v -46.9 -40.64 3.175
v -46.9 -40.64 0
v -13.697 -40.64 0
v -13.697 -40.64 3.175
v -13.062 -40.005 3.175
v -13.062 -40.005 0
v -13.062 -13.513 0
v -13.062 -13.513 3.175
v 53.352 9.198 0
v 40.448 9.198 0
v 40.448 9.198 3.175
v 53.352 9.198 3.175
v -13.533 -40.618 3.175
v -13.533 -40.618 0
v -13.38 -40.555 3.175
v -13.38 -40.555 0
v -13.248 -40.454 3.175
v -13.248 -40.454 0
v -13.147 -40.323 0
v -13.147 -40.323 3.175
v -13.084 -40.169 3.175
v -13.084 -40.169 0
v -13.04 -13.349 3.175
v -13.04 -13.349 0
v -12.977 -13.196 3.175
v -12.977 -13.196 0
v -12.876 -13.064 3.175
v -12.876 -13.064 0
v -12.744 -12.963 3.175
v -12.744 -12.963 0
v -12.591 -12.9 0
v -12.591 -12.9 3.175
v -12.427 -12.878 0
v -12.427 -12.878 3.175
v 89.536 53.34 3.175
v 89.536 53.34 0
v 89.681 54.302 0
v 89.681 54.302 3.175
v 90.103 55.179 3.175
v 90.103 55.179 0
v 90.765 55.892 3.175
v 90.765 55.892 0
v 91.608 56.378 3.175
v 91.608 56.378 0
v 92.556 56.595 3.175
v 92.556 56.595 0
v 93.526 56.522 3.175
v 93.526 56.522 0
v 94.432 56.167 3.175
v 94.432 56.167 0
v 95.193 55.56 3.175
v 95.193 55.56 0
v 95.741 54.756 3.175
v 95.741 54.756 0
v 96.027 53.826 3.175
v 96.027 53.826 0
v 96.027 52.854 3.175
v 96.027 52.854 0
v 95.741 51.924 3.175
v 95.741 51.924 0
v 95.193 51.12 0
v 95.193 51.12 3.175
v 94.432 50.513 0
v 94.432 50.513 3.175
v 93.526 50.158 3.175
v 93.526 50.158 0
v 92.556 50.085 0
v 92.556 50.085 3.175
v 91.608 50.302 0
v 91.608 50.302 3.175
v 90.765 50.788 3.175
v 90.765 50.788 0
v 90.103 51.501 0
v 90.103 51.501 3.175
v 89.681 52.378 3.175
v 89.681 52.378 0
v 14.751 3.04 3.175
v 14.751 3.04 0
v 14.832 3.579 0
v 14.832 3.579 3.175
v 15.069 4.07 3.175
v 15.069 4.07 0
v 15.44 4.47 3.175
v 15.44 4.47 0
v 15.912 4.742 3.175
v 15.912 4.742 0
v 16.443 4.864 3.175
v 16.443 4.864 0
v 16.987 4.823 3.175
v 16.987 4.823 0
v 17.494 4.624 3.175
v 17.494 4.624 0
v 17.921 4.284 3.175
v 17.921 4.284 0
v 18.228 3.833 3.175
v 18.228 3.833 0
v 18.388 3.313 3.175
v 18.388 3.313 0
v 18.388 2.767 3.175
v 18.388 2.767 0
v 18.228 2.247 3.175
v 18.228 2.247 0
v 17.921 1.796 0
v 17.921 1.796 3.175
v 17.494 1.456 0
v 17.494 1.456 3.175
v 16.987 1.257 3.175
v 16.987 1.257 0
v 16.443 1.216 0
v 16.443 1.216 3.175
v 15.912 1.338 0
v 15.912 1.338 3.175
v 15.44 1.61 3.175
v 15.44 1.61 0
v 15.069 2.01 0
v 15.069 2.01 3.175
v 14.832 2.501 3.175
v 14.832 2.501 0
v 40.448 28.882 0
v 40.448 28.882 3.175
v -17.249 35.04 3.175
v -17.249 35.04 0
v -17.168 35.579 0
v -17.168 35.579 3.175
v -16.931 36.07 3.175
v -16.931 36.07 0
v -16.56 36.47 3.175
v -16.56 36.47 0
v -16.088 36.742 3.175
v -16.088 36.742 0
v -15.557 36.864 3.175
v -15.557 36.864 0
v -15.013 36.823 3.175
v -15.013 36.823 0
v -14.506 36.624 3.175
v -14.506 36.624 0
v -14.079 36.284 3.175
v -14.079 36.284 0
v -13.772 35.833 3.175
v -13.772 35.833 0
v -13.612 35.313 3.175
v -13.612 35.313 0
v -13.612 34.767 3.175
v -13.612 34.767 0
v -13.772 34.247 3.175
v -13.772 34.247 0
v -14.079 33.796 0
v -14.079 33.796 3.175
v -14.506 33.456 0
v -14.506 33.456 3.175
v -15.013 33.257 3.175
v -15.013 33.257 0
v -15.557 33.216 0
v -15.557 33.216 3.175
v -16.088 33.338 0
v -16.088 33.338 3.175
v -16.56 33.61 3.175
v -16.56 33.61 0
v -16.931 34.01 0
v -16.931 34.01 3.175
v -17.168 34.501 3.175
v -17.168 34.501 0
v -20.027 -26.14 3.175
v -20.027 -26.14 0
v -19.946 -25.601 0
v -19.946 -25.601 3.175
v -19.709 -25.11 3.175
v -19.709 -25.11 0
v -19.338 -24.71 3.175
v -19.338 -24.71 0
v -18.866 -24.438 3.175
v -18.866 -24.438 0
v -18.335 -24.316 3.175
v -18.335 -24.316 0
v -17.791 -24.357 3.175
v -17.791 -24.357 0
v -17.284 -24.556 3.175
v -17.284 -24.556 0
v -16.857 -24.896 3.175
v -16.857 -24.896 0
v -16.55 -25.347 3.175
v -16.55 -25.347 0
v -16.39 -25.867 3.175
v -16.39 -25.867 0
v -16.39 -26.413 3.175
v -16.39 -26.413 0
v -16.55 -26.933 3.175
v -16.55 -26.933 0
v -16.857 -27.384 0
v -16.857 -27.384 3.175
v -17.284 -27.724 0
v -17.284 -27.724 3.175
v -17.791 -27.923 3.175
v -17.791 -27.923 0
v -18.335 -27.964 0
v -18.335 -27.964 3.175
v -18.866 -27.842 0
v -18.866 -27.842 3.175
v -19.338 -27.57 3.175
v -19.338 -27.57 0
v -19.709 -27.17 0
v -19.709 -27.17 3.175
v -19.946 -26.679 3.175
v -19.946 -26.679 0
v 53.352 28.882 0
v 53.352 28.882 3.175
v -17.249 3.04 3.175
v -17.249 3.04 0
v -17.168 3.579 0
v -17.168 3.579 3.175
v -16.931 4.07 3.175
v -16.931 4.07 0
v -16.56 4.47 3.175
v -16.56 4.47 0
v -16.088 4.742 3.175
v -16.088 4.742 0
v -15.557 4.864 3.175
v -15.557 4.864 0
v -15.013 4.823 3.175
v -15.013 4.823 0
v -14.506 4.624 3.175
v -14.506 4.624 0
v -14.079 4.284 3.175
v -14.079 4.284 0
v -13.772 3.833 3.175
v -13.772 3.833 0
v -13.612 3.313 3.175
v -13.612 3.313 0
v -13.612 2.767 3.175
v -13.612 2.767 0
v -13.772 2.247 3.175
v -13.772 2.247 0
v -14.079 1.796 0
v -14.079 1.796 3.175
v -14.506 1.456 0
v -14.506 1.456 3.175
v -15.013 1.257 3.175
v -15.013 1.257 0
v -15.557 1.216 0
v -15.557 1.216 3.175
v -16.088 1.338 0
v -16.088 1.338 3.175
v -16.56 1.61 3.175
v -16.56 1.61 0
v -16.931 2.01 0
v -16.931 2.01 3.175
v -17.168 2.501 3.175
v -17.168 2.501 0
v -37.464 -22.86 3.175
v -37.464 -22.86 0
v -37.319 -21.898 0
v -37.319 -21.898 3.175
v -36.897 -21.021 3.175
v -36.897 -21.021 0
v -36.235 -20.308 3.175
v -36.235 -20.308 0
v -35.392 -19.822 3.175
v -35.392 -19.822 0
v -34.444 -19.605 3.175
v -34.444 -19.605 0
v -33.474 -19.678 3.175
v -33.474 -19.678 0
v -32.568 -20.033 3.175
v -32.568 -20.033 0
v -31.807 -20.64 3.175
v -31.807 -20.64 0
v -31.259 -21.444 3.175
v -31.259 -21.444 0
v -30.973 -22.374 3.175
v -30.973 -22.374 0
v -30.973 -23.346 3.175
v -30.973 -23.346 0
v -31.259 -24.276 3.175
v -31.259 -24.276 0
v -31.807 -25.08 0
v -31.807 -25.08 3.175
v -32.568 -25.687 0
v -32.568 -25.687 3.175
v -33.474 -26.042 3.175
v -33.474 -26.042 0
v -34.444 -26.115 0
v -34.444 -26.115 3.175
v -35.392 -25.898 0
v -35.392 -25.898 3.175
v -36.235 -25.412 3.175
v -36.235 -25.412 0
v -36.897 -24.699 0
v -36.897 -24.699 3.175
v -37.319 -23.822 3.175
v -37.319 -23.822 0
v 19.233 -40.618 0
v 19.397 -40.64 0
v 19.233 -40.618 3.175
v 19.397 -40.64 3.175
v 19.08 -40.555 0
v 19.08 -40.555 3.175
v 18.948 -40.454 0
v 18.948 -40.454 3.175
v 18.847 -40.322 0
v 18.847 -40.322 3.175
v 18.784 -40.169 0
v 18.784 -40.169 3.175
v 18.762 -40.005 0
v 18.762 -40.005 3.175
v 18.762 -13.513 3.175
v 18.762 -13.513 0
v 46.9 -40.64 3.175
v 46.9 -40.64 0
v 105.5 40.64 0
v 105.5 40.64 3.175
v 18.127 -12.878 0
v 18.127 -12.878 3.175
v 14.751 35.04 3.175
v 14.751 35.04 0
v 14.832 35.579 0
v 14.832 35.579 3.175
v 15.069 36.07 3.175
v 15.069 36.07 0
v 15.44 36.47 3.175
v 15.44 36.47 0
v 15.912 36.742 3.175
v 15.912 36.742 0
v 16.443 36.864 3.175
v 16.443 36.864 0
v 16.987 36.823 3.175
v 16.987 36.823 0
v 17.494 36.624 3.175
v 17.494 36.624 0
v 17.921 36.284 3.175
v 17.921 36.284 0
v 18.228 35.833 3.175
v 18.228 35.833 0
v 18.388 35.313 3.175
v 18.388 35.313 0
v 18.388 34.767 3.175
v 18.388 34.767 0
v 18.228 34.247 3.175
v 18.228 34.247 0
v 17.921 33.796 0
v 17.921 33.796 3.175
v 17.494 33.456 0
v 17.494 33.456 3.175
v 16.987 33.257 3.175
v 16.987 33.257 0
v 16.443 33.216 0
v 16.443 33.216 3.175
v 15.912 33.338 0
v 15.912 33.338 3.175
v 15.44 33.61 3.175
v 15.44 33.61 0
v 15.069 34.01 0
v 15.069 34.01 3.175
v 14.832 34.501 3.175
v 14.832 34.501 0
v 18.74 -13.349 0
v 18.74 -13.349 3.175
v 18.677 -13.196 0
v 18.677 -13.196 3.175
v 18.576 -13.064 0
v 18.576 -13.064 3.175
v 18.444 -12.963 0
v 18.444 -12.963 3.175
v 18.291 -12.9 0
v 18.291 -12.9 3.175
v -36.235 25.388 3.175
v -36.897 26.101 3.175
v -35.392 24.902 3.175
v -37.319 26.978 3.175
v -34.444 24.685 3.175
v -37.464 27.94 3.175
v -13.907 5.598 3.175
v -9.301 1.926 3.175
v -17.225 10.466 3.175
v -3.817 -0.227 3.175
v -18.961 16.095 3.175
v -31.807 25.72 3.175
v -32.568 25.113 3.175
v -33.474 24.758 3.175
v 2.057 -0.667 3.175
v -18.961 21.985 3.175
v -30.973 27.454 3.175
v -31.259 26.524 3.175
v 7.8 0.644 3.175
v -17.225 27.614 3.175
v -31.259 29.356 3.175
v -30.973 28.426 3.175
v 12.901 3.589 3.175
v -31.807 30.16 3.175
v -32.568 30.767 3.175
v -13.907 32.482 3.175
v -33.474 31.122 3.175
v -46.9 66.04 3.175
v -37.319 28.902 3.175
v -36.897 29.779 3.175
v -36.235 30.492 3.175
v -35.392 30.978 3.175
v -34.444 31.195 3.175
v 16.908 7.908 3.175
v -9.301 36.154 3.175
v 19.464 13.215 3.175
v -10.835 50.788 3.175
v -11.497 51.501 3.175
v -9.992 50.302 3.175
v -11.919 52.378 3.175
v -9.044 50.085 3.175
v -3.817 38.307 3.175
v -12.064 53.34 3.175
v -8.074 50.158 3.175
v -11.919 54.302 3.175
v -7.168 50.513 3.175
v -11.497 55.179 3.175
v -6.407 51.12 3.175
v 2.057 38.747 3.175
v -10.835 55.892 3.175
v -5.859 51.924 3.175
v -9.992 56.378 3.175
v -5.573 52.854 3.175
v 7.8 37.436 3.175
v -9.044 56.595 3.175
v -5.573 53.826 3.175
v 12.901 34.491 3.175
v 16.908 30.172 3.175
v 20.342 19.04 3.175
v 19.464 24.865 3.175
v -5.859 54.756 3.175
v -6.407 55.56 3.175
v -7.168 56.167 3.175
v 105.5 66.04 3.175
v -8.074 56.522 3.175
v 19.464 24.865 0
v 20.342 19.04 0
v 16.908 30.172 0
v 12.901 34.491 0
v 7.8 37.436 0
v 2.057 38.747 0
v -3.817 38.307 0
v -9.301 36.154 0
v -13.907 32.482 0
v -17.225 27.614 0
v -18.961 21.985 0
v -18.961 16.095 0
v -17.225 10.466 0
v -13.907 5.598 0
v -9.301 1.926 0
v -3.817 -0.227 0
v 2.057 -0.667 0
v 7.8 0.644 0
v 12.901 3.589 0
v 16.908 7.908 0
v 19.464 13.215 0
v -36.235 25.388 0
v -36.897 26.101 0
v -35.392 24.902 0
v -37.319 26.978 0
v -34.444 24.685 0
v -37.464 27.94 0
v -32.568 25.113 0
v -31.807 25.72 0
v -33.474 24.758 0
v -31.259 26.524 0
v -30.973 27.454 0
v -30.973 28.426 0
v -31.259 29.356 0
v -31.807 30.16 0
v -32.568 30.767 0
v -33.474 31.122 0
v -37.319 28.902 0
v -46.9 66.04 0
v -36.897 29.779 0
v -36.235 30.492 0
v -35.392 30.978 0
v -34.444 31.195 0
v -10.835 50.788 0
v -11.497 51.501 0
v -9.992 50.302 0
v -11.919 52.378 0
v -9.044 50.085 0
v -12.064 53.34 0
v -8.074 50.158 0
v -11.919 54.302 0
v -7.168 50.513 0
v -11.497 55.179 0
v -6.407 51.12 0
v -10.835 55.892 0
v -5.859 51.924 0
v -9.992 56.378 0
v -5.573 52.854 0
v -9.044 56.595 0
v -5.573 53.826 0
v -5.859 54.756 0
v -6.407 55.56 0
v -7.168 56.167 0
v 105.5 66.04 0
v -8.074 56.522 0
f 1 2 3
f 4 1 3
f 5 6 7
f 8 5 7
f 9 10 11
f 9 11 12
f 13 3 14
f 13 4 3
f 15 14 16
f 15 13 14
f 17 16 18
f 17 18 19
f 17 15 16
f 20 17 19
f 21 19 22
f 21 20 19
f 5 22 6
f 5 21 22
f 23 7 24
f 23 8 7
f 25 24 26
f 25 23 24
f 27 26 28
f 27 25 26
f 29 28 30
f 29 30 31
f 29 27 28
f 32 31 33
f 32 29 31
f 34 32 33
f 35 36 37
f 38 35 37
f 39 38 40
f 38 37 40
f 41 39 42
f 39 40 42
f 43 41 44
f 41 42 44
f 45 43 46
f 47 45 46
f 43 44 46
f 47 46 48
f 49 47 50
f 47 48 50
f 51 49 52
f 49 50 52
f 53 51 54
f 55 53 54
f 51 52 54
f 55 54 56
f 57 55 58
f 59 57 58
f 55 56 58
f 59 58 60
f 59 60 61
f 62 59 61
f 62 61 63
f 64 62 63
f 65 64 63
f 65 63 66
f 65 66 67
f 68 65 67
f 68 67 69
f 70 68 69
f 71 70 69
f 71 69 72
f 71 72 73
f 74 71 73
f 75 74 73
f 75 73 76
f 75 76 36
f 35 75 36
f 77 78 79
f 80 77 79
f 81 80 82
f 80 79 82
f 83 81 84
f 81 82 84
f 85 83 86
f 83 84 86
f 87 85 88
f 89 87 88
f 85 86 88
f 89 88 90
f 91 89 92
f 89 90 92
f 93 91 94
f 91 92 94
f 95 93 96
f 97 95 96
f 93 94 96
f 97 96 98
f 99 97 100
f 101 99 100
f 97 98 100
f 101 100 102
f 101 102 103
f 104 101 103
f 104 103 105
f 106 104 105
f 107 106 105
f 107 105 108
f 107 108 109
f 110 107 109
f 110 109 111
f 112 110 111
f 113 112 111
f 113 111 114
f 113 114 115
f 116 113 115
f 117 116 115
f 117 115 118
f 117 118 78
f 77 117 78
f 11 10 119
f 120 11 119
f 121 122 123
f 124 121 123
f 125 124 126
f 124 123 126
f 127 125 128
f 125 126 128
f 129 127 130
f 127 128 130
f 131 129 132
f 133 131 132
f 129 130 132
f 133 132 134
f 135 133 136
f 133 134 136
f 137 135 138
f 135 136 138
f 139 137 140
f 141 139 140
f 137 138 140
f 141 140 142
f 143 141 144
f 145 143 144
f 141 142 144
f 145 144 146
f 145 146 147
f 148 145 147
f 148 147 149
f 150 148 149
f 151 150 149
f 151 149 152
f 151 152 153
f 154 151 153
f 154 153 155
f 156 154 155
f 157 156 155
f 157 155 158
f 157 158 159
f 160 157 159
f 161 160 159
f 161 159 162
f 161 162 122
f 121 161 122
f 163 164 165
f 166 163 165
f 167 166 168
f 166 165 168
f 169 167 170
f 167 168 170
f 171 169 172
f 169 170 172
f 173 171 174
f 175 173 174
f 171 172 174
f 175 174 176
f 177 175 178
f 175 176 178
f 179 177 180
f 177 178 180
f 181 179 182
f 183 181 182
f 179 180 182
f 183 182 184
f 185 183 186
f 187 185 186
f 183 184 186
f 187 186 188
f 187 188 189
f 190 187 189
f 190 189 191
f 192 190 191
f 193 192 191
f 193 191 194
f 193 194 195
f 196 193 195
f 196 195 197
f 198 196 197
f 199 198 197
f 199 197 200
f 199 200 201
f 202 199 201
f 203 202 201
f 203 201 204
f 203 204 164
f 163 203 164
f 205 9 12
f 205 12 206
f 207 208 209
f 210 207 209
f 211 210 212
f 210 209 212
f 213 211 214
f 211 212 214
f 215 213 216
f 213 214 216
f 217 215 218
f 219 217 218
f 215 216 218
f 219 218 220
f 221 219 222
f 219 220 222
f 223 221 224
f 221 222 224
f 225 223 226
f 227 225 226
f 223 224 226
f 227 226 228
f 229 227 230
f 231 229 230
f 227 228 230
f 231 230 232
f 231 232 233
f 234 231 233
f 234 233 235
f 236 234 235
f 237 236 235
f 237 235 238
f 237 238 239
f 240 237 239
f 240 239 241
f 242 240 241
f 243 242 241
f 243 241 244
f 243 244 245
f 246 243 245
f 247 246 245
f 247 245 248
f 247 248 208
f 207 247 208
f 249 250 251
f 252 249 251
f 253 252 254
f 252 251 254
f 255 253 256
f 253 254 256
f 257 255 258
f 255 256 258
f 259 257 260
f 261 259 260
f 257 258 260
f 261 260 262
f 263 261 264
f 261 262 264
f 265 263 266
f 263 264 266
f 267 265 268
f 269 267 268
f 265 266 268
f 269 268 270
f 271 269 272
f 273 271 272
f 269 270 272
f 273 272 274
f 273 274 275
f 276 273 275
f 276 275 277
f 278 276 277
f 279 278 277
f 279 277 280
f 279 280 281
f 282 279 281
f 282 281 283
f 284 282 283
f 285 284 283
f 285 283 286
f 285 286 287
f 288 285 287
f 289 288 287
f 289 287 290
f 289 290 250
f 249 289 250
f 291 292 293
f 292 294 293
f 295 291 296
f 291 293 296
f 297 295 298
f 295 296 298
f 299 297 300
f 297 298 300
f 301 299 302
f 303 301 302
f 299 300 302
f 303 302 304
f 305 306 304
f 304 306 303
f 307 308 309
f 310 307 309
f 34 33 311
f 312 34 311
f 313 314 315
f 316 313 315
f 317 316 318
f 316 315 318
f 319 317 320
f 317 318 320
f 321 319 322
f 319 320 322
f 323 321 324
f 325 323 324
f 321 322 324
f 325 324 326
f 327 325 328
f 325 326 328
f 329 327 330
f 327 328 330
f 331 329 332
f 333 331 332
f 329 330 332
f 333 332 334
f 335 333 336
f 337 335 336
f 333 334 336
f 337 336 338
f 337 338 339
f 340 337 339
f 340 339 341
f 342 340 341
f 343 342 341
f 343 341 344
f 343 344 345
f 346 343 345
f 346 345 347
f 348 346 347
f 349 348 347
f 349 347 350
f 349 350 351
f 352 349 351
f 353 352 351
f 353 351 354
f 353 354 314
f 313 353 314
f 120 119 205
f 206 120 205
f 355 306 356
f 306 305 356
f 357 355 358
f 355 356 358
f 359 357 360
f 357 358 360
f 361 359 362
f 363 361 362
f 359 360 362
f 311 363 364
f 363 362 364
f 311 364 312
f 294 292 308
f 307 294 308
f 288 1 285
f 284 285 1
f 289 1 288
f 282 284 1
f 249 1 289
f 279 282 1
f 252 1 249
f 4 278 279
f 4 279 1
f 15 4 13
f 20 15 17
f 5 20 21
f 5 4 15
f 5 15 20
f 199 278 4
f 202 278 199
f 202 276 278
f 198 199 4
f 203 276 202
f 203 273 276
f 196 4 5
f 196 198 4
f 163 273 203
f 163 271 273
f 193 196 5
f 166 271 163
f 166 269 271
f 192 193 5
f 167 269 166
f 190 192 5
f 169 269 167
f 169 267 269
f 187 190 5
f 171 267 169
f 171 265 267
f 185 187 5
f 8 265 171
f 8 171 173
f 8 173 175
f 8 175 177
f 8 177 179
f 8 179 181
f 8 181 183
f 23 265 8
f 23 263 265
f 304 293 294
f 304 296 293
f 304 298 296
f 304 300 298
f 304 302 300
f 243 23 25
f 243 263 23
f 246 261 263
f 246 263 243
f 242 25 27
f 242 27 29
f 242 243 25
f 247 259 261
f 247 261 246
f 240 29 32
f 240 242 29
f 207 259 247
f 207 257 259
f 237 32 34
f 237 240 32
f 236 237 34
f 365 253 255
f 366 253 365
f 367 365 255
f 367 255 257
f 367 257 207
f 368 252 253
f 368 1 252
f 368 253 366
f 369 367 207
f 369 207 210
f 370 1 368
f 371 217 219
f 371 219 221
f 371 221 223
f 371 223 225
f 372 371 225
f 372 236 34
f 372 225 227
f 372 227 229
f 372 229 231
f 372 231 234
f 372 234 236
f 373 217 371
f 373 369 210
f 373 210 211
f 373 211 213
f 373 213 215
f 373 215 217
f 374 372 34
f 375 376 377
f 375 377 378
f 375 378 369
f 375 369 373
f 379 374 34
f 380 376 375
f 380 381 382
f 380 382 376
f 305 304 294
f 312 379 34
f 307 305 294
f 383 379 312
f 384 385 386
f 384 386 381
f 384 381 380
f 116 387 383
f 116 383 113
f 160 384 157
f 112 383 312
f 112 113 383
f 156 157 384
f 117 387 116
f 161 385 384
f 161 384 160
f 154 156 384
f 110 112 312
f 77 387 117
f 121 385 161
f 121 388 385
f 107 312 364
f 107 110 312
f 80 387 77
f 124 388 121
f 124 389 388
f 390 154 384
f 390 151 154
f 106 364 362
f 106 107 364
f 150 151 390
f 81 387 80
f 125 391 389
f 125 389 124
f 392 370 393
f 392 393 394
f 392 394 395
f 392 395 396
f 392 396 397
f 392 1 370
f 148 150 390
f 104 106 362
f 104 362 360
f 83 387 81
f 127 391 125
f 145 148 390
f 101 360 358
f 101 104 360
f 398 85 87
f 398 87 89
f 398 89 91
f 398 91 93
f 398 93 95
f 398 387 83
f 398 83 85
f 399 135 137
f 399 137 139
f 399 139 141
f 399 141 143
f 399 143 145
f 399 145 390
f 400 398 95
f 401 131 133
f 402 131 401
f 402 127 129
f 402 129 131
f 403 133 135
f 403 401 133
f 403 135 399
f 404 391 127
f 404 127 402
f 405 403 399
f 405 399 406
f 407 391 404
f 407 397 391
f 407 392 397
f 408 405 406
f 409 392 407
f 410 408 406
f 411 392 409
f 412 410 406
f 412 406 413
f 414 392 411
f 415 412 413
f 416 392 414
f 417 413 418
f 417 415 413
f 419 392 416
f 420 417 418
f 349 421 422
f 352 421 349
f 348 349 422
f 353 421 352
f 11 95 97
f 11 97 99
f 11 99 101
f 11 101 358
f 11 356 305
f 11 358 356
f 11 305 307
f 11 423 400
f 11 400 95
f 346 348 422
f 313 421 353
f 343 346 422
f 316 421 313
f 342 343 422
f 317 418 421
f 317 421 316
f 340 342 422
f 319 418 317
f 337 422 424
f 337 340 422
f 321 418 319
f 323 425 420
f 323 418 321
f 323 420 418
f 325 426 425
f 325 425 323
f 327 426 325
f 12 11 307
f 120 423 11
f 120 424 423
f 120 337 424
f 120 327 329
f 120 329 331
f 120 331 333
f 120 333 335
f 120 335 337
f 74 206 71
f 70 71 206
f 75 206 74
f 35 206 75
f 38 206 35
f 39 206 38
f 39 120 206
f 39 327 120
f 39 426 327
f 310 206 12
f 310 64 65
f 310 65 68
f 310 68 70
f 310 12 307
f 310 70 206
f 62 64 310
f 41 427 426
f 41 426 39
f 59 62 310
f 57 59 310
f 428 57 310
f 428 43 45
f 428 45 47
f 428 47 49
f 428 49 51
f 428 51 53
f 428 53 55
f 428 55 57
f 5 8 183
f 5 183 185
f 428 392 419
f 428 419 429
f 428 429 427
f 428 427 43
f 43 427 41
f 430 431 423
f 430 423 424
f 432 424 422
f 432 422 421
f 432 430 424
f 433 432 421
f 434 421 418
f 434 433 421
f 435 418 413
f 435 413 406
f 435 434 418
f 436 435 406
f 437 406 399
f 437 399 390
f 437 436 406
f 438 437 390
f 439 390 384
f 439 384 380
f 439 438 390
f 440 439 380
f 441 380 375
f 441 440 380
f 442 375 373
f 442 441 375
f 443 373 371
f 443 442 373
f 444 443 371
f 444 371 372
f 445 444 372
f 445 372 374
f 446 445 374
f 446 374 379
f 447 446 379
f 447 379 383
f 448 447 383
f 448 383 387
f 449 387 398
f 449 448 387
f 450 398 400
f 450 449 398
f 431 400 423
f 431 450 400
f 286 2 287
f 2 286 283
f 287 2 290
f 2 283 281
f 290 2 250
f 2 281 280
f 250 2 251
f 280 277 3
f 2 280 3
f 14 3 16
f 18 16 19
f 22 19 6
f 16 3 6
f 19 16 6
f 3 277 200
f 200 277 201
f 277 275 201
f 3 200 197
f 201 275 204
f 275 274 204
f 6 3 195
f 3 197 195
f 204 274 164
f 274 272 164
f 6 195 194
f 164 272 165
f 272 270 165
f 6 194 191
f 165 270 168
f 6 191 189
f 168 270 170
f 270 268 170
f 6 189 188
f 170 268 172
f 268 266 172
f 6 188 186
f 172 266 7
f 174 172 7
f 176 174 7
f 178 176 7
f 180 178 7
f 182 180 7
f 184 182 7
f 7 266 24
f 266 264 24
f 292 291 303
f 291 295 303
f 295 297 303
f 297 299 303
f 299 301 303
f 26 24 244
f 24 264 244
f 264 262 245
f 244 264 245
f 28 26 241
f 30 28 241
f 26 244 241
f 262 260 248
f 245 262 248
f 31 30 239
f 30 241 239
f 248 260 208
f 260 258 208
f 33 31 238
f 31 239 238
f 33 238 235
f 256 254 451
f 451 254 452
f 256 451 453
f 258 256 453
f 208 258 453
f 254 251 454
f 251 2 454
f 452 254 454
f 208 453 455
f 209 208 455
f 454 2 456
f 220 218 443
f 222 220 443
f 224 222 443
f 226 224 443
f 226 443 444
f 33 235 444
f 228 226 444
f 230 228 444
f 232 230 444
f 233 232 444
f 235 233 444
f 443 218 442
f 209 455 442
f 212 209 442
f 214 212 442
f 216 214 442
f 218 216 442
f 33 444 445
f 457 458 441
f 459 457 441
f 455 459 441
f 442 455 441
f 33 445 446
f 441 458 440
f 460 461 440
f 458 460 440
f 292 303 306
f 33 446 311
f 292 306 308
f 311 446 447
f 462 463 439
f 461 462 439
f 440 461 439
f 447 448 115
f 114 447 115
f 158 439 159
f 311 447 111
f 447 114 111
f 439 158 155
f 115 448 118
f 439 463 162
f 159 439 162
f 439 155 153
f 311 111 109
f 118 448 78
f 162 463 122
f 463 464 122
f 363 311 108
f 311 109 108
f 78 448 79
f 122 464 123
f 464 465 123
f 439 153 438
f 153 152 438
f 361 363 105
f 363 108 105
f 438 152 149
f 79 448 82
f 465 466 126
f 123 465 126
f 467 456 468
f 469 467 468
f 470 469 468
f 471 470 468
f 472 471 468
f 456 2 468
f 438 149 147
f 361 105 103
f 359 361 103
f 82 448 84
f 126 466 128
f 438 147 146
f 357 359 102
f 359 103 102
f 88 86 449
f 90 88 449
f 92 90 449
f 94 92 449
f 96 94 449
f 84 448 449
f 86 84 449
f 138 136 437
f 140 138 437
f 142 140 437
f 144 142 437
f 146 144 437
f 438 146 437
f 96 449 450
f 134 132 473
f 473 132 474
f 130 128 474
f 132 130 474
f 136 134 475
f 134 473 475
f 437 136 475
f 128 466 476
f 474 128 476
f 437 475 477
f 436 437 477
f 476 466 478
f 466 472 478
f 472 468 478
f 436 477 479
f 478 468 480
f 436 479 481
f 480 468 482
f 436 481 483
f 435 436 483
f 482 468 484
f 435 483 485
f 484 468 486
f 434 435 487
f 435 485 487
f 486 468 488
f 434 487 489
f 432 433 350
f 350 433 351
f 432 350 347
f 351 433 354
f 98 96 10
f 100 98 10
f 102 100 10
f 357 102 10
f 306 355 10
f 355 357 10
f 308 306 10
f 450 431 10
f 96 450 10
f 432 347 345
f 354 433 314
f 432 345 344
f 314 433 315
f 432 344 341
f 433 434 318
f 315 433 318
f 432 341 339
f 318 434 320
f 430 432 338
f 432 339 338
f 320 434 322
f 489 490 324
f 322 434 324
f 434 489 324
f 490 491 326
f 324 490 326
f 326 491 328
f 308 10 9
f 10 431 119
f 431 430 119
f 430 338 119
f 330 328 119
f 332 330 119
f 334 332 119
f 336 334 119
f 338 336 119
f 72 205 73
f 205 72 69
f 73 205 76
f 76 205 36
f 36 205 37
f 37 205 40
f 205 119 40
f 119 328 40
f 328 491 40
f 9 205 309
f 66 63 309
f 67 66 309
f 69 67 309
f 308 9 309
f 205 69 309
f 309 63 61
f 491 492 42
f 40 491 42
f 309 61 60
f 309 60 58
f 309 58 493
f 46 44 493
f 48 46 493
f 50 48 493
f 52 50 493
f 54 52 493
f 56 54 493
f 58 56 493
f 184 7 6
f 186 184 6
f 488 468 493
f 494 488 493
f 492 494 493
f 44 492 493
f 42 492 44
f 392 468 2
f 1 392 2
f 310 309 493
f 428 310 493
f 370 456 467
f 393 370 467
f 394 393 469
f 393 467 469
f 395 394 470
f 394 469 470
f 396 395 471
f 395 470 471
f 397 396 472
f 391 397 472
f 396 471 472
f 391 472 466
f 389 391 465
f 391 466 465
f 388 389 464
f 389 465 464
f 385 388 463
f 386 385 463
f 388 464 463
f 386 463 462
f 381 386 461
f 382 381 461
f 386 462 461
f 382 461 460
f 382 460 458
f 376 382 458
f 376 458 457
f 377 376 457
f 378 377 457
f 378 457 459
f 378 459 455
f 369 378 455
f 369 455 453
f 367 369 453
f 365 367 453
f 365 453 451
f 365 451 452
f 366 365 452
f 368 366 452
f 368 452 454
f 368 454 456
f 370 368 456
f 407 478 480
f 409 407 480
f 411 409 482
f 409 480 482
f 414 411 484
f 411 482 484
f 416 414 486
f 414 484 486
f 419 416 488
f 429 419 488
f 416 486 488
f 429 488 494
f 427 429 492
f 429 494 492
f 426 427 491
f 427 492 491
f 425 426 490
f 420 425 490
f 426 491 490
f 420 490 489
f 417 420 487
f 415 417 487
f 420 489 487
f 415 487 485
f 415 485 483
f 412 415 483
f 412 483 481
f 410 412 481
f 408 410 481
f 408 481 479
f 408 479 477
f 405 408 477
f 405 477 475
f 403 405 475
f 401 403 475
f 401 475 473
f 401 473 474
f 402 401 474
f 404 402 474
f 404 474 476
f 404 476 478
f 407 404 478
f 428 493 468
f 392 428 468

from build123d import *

# Parameters (mm, degrees)
SKETCH2_R               = 19.762
SKETCH2_W               = 12.9032
SKETCH2_H               = 19.685
BOSS_EXTRUDE1_DEPTH     = 3.175
F_6_CLEARANCE_HOLE1_D   = 3.6576
FILLET1_R               = 0.635
F_1_4_CLEARANCE_HOLE1_D = 6.5278


with BuildPart() as part:
    # Sketch2 → Boss-Extrude1 (new body)
    with BuildSketch(Plane.XY):
        Polygon((105.5, 66.04), (-46.9, 66.04), (-46.9, -40.64), (-13.062, -40.64), (-13.062, -12.878), (18.762, -12.878), (18.762, -40.64), (46.9, -40.64), (105.5, 40.64), align=None)
        with Locations((0.58, 19.04)):
            Circle(SKETCH2_R, mode=Mode.SUBTRACT)
        with Locations((46.9, 19.04)):
            Rectangle(SKETCH2_W, SKETCH2_H, mode=Mode.SUBTRACT)
    extrude(amount=BOSS_EXTRUDE1_DEPTH)

    # #6 Clearance Hole1 (through all)
    with Locations(Plane.XY.offset(3.175)):
        with Locations((-15.42, 35.04), (16.58, 35.04), (16.58, 3.04), (-15.42, 3.04), (-18.198, -26.14)):
            Hole(F_6_CLEARANCE_HOLE1_D / 2)

    # Fillet1
    fillet1_edges = [part.edges().sort_by_distance(p)[0] for p in [
        (18.762, -40.64, 1.5875),
        (18.762, -12.878, 1.5875),
        (-13.062, -12.878, 1.5875),
        (-13.062, -40.64, 1.5875),
    ]]
    fillet(fillet1_edges, radius=FILLET1_R)

    # 1/4 Clearance Hole1 (through all)
    with Locations(Plane.XY.offset(3.175)):
        with Locations((-34.2, -22.86), (-8.8, 53.34), (92.8, 53.34), (-34.2, 27.94)):
            Hole(F_1_4_CLEARANCE_HOLE1_D / 2)


solid = part.part
